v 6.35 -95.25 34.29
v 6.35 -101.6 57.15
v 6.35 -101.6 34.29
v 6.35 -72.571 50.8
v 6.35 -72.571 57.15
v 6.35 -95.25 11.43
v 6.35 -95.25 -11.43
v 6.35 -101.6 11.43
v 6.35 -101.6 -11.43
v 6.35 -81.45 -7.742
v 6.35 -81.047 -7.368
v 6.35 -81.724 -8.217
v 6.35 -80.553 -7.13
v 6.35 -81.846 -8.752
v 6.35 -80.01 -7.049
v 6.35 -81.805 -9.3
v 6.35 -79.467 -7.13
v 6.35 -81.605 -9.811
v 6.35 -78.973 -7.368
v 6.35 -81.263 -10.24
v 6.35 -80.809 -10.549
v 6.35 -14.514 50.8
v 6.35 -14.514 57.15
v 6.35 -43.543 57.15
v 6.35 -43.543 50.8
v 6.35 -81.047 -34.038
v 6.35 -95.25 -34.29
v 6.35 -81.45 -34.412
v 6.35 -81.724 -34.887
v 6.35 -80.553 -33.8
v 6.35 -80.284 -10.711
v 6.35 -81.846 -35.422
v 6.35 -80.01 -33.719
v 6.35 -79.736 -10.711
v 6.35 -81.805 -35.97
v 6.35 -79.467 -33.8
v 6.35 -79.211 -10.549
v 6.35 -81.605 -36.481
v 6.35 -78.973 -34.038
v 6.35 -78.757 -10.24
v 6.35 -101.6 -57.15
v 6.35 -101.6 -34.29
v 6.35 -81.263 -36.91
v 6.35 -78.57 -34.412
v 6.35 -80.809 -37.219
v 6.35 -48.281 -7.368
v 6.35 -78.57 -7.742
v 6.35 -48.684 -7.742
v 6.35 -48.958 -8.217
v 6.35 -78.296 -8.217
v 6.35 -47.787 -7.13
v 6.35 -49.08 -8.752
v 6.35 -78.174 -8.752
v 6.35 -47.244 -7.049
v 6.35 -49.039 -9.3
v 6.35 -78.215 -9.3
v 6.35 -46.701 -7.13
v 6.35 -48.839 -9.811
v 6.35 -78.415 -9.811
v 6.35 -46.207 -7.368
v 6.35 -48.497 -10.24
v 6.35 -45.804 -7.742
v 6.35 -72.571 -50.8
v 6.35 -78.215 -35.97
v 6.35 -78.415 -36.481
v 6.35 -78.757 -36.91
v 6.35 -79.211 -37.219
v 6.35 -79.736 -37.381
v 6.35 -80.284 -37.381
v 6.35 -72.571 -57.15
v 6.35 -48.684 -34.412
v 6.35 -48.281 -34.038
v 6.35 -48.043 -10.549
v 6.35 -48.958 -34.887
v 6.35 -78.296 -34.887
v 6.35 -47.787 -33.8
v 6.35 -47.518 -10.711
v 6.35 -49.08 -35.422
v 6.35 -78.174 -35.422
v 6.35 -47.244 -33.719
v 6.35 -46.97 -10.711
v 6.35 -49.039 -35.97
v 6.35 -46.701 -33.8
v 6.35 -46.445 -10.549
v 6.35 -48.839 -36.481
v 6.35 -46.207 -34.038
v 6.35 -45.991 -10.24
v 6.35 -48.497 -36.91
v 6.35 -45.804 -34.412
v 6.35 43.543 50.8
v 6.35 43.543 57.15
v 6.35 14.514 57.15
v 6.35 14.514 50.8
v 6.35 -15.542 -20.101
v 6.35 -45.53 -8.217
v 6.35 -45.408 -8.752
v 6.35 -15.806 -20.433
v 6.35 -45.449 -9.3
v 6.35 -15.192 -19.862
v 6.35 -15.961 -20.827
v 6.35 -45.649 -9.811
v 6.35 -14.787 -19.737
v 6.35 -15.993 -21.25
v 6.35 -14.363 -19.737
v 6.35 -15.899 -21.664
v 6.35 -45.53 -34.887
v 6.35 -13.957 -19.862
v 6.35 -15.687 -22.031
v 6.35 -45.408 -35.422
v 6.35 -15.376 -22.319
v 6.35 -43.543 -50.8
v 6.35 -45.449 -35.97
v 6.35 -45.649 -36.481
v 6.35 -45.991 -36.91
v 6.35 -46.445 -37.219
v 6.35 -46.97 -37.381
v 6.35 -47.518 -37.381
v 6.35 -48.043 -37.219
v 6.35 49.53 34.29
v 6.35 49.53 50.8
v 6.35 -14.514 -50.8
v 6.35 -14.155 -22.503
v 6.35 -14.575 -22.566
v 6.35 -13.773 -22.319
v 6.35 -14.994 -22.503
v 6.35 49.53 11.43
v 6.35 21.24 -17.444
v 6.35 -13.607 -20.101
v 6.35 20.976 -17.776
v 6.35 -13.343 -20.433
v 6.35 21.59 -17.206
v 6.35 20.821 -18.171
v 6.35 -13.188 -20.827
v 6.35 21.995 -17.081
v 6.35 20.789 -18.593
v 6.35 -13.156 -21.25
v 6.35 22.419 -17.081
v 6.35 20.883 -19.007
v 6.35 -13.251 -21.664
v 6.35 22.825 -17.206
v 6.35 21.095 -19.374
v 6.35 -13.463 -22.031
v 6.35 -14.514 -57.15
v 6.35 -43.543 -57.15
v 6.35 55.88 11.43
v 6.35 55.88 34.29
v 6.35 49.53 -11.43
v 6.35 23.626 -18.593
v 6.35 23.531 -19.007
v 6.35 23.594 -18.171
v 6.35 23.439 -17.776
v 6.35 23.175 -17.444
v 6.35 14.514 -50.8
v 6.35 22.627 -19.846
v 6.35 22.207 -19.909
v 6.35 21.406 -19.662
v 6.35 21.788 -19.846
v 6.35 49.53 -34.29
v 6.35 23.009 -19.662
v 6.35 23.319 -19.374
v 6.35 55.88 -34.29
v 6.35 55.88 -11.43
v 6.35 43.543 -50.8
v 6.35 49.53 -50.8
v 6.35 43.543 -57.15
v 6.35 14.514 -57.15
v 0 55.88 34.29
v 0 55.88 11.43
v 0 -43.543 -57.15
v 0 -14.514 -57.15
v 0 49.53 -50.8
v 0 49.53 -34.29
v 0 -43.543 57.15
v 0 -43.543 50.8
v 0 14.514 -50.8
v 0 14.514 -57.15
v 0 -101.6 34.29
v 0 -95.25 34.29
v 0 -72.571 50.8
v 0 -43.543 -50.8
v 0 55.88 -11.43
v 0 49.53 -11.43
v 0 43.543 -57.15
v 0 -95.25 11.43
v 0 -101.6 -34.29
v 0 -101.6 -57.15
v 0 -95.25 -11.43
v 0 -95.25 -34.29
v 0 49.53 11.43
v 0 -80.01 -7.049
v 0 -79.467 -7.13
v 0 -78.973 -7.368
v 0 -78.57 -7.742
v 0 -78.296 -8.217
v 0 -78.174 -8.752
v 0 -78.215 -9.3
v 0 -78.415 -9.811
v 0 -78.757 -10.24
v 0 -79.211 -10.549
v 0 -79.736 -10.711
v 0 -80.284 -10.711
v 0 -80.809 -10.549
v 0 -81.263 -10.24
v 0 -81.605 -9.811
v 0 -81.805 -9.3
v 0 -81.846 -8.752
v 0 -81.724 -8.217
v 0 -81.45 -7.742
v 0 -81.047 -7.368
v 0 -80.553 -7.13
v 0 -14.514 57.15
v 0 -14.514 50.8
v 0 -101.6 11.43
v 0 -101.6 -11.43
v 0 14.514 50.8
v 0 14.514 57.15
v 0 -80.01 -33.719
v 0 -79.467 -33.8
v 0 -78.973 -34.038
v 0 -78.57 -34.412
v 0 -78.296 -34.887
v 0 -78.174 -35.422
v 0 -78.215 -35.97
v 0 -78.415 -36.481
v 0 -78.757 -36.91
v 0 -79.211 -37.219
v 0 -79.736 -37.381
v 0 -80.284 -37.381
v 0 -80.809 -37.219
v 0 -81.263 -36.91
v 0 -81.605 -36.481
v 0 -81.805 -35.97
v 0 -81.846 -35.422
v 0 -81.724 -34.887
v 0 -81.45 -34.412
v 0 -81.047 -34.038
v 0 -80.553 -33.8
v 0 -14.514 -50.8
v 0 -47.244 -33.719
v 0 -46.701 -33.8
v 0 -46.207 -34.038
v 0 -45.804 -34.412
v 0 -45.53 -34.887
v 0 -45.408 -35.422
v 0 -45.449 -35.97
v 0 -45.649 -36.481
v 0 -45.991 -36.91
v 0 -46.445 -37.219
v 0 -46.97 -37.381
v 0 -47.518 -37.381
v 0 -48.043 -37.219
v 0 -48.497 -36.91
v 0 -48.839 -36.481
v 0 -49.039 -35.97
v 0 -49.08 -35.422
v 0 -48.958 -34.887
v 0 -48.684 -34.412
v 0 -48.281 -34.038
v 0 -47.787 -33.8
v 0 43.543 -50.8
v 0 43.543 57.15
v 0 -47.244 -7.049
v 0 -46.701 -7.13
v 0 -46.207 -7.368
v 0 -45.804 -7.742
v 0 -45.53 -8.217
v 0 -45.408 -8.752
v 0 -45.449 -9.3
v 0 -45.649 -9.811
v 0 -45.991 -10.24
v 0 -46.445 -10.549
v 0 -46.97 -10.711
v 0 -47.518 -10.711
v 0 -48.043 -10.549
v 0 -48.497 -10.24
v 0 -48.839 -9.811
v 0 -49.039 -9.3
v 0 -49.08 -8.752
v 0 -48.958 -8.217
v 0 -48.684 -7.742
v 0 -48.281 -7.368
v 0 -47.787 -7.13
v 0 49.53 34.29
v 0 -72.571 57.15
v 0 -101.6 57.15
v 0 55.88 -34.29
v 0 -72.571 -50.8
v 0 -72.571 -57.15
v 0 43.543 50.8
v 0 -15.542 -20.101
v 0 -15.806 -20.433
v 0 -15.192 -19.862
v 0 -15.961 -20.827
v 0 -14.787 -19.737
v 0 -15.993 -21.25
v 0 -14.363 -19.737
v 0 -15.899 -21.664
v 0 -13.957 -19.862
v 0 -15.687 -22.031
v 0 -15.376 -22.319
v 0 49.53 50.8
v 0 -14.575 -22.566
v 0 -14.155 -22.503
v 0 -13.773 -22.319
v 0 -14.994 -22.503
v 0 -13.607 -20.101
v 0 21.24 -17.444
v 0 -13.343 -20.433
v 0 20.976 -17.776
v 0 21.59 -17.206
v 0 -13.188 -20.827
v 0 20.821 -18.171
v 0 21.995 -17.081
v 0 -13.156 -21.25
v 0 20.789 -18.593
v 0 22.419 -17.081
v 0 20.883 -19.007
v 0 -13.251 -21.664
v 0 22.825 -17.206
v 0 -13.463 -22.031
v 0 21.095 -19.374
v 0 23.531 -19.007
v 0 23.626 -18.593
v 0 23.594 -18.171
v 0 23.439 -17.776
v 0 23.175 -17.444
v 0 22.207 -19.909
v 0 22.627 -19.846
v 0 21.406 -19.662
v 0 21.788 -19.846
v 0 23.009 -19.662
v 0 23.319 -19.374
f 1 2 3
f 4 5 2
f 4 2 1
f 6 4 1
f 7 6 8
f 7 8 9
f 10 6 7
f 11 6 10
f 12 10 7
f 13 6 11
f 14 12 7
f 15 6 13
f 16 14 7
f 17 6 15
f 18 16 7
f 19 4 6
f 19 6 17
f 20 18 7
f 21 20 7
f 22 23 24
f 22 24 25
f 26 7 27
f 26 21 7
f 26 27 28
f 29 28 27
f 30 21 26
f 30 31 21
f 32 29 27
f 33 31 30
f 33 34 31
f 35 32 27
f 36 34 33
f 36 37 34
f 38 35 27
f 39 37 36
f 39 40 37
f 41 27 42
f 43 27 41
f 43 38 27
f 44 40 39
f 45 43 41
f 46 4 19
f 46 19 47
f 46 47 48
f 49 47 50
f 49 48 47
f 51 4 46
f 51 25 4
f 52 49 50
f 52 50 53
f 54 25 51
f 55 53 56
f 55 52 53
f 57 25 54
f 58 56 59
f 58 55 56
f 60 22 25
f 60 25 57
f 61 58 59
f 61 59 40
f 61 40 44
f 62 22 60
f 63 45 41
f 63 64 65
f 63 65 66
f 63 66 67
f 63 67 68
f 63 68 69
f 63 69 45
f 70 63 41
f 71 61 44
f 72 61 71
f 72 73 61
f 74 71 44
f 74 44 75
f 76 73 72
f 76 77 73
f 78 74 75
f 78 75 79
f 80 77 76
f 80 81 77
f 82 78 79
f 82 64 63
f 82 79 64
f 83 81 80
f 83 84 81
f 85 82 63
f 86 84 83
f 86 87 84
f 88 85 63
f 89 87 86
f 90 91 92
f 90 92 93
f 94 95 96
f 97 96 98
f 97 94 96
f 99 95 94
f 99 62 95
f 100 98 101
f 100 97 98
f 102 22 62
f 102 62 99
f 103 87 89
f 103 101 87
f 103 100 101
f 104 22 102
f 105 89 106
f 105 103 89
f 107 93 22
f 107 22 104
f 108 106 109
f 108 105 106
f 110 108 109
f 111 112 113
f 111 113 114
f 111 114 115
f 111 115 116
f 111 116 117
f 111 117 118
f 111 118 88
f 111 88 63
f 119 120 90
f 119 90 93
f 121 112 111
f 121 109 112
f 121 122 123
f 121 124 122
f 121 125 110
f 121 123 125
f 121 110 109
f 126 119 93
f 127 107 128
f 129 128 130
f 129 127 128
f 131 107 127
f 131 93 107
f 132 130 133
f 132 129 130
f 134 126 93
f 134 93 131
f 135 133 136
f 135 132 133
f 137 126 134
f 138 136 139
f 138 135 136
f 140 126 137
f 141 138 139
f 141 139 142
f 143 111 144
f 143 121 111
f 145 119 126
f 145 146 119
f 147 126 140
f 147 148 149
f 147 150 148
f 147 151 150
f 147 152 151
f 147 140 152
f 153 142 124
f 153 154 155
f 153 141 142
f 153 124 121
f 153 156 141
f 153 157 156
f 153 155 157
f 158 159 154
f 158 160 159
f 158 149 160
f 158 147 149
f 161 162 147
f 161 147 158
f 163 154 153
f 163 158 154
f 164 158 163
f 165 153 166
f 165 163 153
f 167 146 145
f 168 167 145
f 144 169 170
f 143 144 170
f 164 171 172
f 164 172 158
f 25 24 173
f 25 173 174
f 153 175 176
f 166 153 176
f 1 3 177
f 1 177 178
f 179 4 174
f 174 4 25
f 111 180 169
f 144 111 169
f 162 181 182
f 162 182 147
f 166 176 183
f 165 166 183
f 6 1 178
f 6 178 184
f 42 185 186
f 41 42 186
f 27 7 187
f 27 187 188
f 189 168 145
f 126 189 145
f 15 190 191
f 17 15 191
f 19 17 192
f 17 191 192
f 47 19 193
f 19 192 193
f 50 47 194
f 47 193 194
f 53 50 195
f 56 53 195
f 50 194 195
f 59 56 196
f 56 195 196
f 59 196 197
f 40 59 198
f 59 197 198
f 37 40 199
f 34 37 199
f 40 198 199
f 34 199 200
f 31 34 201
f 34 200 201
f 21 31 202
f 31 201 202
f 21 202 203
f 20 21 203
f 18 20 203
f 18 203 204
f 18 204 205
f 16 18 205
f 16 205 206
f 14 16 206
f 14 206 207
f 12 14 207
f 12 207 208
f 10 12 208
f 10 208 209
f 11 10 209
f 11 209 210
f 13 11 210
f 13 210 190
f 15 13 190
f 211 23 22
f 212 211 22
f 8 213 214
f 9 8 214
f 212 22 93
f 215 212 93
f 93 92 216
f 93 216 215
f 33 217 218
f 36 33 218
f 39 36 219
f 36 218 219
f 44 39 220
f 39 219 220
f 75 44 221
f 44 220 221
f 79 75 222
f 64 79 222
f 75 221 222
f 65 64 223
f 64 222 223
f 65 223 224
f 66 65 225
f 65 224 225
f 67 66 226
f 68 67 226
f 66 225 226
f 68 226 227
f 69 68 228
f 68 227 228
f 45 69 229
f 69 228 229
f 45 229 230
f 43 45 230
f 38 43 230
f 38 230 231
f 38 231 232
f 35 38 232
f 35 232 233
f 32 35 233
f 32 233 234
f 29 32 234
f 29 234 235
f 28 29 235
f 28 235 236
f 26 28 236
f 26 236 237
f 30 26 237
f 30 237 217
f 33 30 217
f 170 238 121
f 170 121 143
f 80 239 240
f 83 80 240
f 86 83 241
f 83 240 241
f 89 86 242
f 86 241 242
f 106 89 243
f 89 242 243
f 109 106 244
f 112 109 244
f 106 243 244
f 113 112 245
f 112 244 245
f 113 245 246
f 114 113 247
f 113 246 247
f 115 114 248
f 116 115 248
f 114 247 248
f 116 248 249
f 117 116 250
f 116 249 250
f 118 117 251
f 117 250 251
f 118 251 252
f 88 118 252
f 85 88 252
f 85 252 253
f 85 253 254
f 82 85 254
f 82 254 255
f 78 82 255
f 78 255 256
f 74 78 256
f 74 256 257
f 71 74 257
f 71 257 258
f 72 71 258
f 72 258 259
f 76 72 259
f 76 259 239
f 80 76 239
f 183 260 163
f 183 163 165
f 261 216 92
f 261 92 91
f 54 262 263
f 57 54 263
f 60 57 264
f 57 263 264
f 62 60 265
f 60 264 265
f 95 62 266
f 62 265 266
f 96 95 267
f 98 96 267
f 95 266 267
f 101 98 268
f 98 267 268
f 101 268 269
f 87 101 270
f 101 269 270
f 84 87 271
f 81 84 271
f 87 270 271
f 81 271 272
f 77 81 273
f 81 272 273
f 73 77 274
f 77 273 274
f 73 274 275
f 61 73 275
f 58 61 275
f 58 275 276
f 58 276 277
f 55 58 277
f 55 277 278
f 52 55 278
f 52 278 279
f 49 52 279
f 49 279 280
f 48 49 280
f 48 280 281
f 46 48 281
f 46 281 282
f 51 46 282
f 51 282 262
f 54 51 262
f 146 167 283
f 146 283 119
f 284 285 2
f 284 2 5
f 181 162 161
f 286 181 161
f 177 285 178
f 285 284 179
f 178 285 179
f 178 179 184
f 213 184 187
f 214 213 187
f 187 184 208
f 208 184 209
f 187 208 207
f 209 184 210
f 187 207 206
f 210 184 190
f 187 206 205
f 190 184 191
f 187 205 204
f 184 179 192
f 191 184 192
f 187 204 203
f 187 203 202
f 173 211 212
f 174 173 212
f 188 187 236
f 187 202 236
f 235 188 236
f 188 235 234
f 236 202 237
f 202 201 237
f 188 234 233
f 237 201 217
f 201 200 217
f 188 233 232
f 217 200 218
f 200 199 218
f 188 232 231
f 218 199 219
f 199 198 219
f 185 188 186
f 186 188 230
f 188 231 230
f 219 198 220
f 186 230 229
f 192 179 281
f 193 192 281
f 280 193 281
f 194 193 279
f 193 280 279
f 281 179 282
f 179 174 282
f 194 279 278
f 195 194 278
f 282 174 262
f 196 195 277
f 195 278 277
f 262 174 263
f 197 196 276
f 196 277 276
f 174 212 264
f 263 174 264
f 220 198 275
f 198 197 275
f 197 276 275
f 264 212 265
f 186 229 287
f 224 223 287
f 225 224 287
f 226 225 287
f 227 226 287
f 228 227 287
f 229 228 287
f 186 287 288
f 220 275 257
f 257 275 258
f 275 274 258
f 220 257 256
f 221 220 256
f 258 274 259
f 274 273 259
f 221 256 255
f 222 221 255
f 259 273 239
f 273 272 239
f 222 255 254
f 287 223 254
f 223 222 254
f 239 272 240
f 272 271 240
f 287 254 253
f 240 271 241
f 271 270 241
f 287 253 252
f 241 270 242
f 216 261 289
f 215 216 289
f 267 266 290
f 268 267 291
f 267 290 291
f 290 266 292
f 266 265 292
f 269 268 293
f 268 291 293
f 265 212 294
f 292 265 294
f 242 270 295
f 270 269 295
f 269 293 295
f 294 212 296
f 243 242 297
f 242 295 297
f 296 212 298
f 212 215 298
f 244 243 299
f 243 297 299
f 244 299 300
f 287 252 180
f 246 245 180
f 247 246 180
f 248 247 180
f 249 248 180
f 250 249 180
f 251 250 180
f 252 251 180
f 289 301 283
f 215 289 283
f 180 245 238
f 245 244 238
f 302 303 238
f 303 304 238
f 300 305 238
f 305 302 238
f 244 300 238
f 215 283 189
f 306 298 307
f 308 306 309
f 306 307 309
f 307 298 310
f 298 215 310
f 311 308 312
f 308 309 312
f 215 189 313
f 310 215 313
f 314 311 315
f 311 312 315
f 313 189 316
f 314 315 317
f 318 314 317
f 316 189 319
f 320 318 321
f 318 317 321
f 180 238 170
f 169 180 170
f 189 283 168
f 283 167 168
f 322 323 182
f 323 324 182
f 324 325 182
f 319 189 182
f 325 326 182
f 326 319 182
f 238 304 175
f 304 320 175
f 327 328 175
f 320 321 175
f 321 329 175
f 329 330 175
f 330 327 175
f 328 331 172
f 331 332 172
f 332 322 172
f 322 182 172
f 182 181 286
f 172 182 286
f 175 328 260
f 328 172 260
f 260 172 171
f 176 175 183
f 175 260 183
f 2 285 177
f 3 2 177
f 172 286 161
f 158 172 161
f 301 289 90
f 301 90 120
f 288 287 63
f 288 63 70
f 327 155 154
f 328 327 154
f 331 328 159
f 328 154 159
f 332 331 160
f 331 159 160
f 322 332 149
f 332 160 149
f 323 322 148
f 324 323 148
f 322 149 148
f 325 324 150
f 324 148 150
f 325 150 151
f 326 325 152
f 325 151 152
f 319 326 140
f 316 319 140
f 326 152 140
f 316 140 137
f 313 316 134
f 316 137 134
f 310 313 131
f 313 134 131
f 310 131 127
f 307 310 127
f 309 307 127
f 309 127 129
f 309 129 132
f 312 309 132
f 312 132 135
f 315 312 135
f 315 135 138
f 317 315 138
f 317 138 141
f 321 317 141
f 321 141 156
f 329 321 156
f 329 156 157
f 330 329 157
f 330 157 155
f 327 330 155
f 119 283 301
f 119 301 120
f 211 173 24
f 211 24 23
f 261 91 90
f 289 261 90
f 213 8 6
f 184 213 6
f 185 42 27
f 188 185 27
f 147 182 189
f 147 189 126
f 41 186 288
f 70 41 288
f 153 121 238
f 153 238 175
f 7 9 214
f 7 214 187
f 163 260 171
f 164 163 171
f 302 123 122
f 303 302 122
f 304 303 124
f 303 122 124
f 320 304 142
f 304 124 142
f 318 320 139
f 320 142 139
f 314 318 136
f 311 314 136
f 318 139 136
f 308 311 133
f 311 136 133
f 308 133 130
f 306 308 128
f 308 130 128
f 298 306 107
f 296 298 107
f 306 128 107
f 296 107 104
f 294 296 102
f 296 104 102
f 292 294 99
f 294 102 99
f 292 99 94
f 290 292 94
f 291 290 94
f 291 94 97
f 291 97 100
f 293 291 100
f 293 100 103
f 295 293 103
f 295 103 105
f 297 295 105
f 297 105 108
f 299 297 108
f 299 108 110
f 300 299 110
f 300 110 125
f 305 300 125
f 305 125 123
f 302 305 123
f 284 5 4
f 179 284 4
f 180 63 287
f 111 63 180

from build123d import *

# Parameters (mm, degrees)
SKETCH1_W           = 114.3
SKETCH1_H           = 203.2
BOSS_EXTRUDE1_DEPTH = 6.35
SKETCH3_W           = 6.35
SKETCH3_H           = 29.028571428
CUT_EXTRUDE4_DEPTH  = 117.743329574
SKETCH5_W           = 22.86
SKETCH5_H           = 6.35
CUT_EXTRUDE5_DEPTH  = 117.743329574
CUT_EXTRUDE6_DEPTH  = 117.743329574
CAVITY1_START       = -11.43
CAVITY1_OUTLINE_W   = 6.35
CAVITY1_OUTLINE_H   = 6.35
CAVITY1_DEPTH       = 22.86
CAVITY1_START_2     = -50.8
CAVITY1_2_OUTLINE_W = 6.35
CAVITY1_2_OUTLINE_H = 6.35
CAVITY1_2_DEPTH     = 16.51
CAVITY1_START_3     = 34.29
CAVITY1_3_OUTLINE_W = 6.35
CAVITY1_3_OUTLINE_H = 6.35
CAVITY1_3_DEPTH     = 16.51
SKETCH7_R           = 1.4224
CUT_EXTRUDE7_DEPTH  = 117.743329574
SKETCH8_R           = 1.8415
CUT_EXTRUDE8_DEPTH  = 117.743329574


# Read off the part's stored shape, not the designer's step: Cavity1
with BuildPart() as part:
    # Sketch1 → Boss-Extrude1 (new body)
    with BuildSketch(Plane(origin=(0, 0, 0), x_dir=(0, 0, -1), z_dir=(1, 0, 0))):
        Rectangle(SKETCH1_W, SKETCH1_H)
    extrude(amount=BOSS_EXTRUDE1_DEPTH)

    # Sketch3 → Cut-Extrude4 (cut, through all)
    with BuildSketch(Plane(origin=(6.35, 0, 0), x_dir=(0, 0, -1), z_dir=(1, 0, 0))):
        with Locations((-53.975, -58.057142857)):
            Rectangle(SKETCH3_W, SKETCH3_H)
        with Locations((-53.975, 0)):
            Rectangle(SKETCH3_W, SKETCH3_H)
        with Locations((-53.975, 58.057142857)):
            Rectangle(SKETCH3_W, SKETCH3_H)
        with Locations((53.975, 58.057142857)):
            Rectangle(SKETCH3_W, SKETCH3_H)
        with Locations((53.975, 0)):
            Rectangle(SKETCH3_W, SKETCH3_H)
        with Locations((53.975, -58.057142857)):
            Rectangle(SKETCH3_W, SKETCH3_H)
    extrude(amount=-CUT_EXTRUDE4_DEPTH, mode=Mode.SUBTRACT)

    # Sketch5 → Cut-Extrude5 (cut, through all)
    with BuildSketch(Plane(origin=(6.35, 0, 0), x_dir=(0, 0, -1), z_dir=(1, 0, 0))):
        with Locations((-22.86, -98.425)):
            Rectangle(SKETCH5_W, SKETCH5_H)
        with Locations((22.86, -98.425)):
            Rectangle(SKETCH5_W, SKETCH5_H)
    extrude(amount=-CUT_EXTRUDE5_DEPTH, mode=Mode.SUBTRACT)

    # Sketch6 → Cut-Extrude6 (cut, through all)
    with BuildSketch(Plane(origin=(6.35, 0, 0), x_dir=(0, 0, -1), z_dir=(1, 0, 0))):
        Polygon((0, 55.88), (50.8, 55.88), (50.8, 72.571428571), (57.15, 72.571428571), (57.15, 101.6), (-57.15, 101.6), (-57.15, 72.571428571), (-50.8, 72.571428571), (-50.8, 55.88), align=None)
    extrude(amount=-CUT_EXTRUDE6_DEPTH, mode=Mode.SUBTRACT)

    # Cavity1 outline → Cavity1 (cut)
    with BuildSketch(Plane.XY.offset(CAVITY1_START)):
        with Locations((3.175, 52.705)):
            Rectangle(CAVITY1_OUTLINE_W, CAVITY1_OUTLINE_H)
    extrude(amount=CAVITY1_DEPTH, mode=Mode.SUBTRACT)

    # Cavity1 2 outline → Cavity1 2 (cut)
    with BuildSketch(Plane.XY.offset(CAVITY1_START_2)):
        with Locations((3.175, 52.705)):
            Rectangle(CAVITY1_2_OUTLINE_W, CAVITY1_2_OUTLINE_H)
    extrude(amount=CAVITY1_2_DEPTH, mode=Mode.SUBTRACT)

    # Cavity1 3 outline → Cavity1 3 (cut)
    with BuildSketch(Plane.XY.offset(CAVITY1_START_3)):
        with Locations((3.175, 52.705)):
            Rectangle(CAVITY1_3_OUTLINE_W, CAVITY1_3_OUTLINE_H)
    extrude(amount=CAVITY1_3_DEPTH, mode=Mode.SUBTRACT)

    # Sketch7 → Cut-Extrude7 (cut, through all)
    with BuildSketch(Plane(origin=(6.35, 0, 0), x_dir=(0, 0, -1), z_dir=(1, 0, 0))):
        with Locations((18.487090642, 22.207344877)):
            Circle(SKETCH7_R)
        with Locations((21.143949011, -14.574648396)):
            Circle(SKETCH7_R)
    extrude(amount=-CUT_EXTRUDE7_DEPTH, mode=Mode.SUBTRACT)

    # Sketch8 → Cut-Extrude8 (cut, through all)
    with BuildSketch(Plane.ZY):
        with Locations((-35.56, -47.244)):
            Circle(SKETCH8_R)
        with Locations((-8.89, -47.244)):
            Circle(SKETCH8_R)
        with Locations((-35.56, -80.01)):
            Circle(SKETCH8_R)
        with Locations((-8.89, -80.01)):
            Circle(SKETCH8_R)
    extrude(amount=-CUT_EXTRUDE8_DEPTH, mode=Mode.SUBTRACT)


solid = part.part
